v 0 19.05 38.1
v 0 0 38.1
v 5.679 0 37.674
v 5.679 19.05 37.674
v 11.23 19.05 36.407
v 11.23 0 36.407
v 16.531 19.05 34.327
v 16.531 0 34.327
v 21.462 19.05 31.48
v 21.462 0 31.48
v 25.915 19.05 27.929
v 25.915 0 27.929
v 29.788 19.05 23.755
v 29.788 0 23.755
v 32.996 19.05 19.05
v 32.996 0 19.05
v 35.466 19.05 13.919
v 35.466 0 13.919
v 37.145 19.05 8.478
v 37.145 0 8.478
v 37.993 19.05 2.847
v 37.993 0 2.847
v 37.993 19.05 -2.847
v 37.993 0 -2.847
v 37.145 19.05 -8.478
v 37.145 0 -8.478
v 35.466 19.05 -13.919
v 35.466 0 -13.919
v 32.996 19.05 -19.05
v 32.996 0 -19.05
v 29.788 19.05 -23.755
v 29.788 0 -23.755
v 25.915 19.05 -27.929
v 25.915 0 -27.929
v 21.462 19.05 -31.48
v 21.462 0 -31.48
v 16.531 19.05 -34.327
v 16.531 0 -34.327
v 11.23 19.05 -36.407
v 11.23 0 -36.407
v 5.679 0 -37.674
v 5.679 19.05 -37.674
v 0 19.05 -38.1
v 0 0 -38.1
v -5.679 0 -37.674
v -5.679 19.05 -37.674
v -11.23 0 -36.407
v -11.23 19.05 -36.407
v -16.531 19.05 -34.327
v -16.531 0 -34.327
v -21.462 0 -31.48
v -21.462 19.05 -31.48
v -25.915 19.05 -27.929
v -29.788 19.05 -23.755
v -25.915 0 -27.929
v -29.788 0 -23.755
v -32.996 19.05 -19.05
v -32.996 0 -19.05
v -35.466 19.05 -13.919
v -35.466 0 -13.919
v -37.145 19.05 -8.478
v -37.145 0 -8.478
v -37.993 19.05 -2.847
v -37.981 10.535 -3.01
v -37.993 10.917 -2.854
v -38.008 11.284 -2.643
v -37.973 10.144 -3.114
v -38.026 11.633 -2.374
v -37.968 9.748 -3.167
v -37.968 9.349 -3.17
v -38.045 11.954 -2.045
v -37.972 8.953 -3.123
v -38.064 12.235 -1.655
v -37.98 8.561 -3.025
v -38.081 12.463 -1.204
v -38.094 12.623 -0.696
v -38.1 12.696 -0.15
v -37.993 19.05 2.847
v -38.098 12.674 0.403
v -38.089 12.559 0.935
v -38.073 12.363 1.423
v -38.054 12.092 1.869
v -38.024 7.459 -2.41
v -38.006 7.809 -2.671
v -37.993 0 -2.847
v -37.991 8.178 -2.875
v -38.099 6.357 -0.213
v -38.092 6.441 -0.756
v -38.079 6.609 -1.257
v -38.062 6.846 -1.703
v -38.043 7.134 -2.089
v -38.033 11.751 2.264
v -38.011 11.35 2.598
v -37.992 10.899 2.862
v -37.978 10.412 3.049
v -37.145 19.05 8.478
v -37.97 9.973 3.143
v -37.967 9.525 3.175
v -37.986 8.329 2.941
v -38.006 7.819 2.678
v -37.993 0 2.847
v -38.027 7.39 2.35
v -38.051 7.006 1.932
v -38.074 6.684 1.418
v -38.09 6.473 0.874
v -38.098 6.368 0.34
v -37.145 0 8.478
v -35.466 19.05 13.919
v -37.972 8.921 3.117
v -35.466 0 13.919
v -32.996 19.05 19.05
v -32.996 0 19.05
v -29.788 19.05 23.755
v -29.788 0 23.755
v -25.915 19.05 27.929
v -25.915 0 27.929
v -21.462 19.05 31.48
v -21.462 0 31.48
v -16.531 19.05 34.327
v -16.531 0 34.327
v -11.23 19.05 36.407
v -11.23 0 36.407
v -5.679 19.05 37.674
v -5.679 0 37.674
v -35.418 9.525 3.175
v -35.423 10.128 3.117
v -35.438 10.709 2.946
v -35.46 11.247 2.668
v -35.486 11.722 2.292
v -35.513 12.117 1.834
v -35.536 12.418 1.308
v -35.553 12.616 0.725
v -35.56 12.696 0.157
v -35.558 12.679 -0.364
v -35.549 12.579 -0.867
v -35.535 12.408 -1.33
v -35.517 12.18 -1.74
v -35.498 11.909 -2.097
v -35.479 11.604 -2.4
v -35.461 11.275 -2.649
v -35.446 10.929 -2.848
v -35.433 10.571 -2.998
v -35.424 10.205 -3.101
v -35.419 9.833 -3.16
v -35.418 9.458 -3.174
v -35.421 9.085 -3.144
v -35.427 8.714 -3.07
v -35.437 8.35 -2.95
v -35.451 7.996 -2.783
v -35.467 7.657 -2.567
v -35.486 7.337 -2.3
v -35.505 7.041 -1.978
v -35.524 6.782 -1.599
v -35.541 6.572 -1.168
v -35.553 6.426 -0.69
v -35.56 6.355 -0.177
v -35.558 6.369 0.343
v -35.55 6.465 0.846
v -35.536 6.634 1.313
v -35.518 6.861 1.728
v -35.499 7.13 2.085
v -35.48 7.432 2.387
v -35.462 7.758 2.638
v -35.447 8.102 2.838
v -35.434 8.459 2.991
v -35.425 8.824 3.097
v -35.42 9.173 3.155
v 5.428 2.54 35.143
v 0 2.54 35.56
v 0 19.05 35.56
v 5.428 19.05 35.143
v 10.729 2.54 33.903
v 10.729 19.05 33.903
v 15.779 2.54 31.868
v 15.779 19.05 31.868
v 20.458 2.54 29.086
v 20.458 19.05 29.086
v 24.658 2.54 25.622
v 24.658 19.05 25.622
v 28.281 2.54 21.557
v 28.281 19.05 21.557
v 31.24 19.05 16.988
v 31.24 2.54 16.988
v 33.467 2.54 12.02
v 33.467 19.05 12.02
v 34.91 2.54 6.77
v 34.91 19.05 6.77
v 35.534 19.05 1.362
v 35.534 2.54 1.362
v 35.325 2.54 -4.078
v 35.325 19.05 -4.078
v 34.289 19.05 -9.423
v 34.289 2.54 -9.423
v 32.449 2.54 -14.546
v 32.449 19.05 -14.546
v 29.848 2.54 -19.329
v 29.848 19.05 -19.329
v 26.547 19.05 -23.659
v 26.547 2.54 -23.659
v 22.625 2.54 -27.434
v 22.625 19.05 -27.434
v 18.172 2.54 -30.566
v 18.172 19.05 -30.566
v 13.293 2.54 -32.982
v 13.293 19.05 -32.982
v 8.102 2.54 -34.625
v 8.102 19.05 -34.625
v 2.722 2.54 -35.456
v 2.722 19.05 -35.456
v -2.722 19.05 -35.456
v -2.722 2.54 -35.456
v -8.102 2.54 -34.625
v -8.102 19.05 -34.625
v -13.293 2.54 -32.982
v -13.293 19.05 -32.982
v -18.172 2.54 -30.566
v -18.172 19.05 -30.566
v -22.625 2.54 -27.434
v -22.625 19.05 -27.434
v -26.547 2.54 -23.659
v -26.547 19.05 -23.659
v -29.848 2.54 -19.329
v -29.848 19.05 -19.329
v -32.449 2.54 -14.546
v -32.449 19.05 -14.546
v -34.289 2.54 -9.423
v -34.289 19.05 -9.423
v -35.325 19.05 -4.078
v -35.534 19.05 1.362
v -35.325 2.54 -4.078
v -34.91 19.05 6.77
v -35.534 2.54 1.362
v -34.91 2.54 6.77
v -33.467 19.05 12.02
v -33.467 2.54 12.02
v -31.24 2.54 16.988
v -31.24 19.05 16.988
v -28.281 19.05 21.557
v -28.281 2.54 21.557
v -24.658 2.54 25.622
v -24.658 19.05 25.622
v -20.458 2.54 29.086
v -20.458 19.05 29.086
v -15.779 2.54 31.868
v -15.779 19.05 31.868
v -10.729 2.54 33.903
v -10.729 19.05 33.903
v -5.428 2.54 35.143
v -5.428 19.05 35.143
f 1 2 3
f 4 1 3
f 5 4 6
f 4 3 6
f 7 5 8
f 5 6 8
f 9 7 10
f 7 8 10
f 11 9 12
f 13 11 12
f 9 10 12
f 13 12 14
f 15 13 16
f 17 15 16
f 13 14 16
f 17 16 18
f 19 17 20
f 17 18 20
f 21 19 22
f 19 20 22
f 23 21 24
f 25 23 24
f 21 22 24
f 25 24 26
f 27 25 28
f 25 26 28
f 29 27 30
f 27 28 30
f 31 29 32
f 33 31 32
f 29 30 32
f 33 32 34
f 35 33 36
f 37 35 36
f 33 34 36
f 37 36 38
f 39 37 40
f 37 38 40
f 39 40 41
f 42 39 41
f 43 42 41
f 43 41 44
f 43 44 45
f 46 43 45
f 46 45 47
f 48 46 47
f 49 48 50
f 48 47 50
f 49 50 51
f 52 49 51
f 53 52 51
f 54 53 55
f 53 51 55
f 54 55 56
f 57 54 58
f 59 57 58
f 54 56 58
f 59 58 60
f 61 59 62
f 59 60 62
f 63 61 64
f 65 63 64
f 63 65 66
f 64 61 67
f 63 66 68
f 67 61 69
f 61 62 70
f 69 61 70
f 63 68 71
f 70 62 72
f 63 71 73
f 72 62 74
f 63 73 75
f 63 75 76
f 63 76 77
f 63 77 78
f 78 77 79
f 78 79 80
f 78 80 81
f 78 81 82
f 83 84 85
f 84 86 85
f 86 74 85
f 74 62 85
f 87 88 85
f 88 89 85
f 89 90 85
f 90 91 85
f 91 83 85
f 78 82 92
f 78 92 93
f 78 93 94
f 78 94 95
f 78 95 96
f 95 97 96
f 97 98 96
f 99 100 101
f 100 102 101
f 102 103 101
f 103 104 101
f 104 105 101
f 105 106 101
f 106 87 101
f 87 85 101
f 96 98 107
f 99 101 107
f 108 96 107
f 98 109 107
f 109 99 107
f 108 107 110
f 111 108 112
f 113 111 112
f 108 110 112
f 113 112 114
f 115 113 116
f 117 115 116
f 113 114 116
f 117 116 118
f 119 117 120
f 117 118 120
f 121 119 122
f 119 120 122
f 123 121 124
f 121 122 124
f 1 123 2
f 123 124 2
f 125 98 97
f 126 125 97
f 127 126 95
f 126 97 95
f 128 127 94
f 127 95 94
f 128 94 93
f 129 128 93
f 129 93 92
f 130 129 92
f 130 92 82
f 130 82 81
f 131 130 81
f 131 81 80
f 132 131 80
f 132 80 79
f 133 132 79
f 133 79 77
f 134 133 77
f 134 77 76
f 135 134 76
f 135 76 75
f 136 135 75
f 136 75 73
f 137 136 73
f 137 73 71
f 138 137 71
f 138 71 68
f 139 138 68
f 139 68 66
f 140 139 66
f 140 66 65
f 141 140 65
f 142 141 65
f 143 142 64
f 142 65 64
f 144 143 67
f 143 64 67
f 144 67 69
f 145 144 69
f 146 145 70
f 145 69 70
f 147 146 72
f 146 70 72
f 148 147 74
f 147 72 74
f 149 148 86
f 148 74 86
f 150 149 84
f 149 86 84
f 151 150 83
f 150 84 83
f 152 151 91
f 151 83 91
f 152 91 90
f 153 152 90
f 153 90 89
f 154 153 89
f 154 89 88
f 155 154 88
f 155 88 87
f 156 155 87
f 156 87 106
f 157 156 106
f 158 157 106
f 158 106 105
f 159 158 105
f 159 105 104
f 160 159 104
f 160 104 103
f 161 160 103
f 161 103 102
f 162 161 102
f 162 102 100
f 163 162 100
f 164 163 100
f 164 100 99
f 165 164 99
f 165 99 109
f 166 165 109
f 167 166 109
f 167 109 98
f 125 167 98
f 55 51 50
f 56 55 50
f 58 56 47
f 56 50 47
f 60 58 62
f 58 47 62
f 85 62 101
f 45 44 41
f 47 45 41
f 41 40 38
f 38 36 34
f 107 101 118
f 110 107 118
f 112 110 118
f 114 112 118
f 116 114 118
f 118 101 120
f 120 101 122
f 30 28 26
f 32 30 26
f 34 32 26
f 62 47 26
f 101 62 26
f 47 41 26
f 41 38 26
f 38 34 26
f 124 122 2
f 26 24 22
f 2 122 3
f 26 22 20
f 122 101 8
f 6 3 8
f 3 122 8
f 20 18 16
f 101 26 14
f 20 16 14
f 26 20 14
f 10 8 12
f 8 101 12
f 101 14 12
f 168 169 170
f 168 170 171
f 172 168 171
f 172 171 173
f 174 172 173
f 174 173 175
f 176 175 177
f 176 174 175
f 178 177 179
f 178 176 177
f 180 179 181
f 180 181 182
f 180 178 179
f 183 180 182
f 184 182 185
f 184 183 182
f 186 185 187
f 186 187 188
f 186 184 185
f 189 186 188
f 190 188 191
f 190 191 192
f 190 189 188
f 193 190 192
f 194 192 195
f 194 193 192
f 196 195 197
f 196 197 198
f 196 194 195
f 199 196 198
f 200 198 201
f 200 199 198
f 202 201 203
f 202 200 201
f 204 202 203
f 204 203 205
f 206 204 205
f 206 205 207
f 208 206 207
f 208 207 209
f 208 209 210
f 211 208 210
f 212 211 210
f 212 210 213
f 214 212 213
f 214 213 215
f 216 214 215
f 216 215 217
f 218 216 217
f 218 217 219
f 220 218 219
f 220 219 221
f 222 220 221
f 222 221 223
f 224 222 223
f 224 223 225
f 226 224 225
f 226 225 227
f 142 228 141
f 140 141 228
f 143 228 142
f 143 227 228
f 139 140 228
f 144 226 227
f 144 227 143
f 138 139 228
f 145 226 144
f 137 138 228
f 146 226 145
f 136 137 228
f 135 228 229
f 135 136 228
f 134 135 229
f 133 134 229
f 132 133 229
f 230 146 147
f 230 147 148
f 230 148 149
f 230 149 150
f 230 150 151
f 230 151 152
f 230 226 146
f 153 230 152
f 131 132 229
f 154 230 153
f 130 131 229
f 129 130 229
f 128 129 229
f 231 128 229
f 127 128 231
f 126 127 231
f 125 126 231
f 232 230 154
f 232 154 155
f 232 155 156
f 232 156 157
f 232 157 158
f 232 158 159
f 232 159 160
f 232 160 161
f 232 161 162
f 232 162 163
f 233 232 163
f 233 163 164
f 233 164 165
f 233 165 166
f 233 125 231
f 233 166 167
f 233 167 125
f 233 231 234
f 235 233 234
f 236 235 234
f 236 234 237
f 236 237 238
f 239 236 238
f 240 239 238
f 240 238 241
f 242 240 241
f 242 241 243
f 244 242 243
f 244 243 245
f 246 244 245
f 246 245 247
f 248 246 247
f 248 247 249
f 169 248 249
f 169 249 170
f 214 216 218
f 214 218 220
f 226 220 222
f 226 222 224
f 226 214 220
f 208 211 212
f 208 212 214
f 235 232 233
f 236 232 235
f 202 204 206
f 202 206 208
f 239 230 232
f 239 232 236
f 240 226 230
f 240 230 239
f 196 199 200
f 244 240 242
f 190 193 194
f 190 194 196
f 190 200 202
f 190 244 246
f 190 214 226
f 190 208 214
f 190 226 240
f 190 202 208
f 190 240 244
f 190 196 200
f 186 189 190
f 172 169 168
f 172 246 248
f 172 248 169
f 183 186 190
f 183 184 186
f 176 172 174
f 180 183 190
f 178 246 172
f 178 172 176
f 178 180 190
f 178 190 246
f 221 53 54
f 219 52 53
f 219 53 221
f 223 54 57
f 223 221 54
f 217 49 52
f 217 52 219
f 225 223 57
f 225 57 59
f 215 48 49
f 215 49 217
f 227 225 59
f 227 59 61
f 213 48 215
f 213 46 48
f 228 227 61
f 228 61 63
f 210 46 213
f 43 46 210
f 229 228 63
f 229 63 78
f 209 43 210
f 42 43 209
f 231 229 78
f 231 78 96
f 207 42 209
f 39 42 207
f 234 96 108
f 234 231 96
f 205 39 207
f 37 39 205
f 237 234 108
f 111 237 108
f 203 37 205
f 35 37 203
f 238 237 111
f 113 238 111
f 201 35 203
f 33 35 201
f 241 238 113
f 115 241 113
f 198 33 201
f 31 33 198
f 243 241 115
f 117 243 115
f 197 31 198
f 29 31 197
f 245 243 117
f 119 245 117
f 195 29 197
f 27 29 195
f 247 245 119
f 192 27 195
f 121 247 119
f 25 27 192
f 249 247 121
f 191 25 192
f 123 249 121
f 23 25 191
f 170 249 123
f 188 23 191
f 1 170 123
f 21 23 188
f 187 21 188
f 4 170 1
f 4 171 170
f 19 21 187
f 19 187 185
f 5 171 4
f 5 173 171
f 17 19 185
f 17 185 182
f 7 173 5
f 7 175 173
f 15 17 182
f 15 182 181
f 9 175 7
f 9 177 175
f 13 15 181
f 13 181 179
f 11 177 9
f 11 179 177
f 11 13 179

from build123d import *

# Parameters (mm, degrees)
SKETCH1_R               = 38.1
BOSS_EXTRUDE1_DEPTH     = 2.54
SKETCH2_R               = 38.1
SKETCH2_R_2             = 35.56
BOSS_EXTRUDE2_DEPTH     = 16.51
CUT_EXTRUDE1_REACH      = 89.298
CUT_EXTRUDE1_END_RADIUS = 35.56
SKETCH3_R               = 3.175


with BuildPart() as part:
    # Sketch1 → Boss-Extrude1 (new body)
    with BuildSketch(Plane(origin=(0, 0, 0), x_dir=(1, 0, 0), z_dir=(0, 1, 0))):
        with Locations(Location((0, 0, 0), (0, 0, 270))):
            Circle(SKETCH1_R)
    extrude(amount=BOSS_EXTRUDE1_DEPTH)

    # Sketch2 → Boss-Extrude2 (add)
    with BuildSketch(Plane(origin=(0, 2.54, 0), x_dir=(1, 0, 0), z_dir=(0, 1, 0))):
        with Locations(Location((0, 0, 0), (0, 0, 270))):
            Circle(SKETCH2_R)
        with Locations(Location((0, 0, 0), (0, 0, 270))):
            Circle(SKETCH2_R_2, mode=Mode.SUBTRACT)
    extrude(amount=BOSS_EXTRUDE2_DEPTH)

    # Cut-Extrude1: up to this cylinder (the profile starts outside it)
    cut_extrude1_end = Plane(origin=(0, 9.525, 0), z_dir=(0, -1, 0)) * Cylinder(CUT_EXTRUDE1_END_RADIUS, 250.716, mode=Mode.PRIVATE)
    # Sketch3 → Cut-Extrude1 (cut, up to the surface)
    with BuildSketch(Plane.ZY.offset(38.1), mode=Mode.PRIVATE) as cut_extrude1_sk1:
        with Locations((0, 9.525)):
            Circle(SKETCH3_R)
    cut_extrude1_tool1 = extrude(cut_extrude1_sk1.sketch, amount=-CUT_EXTRUDE1_REACH, mode=Mode.PRIVATE) - cut_extrude1_end
    add(cut_extrude1_tool1.solids().sort_by_distance((-38.1, 9.525, 0))[0], mode=Mode.SUBTRACT)


solid = part.part
